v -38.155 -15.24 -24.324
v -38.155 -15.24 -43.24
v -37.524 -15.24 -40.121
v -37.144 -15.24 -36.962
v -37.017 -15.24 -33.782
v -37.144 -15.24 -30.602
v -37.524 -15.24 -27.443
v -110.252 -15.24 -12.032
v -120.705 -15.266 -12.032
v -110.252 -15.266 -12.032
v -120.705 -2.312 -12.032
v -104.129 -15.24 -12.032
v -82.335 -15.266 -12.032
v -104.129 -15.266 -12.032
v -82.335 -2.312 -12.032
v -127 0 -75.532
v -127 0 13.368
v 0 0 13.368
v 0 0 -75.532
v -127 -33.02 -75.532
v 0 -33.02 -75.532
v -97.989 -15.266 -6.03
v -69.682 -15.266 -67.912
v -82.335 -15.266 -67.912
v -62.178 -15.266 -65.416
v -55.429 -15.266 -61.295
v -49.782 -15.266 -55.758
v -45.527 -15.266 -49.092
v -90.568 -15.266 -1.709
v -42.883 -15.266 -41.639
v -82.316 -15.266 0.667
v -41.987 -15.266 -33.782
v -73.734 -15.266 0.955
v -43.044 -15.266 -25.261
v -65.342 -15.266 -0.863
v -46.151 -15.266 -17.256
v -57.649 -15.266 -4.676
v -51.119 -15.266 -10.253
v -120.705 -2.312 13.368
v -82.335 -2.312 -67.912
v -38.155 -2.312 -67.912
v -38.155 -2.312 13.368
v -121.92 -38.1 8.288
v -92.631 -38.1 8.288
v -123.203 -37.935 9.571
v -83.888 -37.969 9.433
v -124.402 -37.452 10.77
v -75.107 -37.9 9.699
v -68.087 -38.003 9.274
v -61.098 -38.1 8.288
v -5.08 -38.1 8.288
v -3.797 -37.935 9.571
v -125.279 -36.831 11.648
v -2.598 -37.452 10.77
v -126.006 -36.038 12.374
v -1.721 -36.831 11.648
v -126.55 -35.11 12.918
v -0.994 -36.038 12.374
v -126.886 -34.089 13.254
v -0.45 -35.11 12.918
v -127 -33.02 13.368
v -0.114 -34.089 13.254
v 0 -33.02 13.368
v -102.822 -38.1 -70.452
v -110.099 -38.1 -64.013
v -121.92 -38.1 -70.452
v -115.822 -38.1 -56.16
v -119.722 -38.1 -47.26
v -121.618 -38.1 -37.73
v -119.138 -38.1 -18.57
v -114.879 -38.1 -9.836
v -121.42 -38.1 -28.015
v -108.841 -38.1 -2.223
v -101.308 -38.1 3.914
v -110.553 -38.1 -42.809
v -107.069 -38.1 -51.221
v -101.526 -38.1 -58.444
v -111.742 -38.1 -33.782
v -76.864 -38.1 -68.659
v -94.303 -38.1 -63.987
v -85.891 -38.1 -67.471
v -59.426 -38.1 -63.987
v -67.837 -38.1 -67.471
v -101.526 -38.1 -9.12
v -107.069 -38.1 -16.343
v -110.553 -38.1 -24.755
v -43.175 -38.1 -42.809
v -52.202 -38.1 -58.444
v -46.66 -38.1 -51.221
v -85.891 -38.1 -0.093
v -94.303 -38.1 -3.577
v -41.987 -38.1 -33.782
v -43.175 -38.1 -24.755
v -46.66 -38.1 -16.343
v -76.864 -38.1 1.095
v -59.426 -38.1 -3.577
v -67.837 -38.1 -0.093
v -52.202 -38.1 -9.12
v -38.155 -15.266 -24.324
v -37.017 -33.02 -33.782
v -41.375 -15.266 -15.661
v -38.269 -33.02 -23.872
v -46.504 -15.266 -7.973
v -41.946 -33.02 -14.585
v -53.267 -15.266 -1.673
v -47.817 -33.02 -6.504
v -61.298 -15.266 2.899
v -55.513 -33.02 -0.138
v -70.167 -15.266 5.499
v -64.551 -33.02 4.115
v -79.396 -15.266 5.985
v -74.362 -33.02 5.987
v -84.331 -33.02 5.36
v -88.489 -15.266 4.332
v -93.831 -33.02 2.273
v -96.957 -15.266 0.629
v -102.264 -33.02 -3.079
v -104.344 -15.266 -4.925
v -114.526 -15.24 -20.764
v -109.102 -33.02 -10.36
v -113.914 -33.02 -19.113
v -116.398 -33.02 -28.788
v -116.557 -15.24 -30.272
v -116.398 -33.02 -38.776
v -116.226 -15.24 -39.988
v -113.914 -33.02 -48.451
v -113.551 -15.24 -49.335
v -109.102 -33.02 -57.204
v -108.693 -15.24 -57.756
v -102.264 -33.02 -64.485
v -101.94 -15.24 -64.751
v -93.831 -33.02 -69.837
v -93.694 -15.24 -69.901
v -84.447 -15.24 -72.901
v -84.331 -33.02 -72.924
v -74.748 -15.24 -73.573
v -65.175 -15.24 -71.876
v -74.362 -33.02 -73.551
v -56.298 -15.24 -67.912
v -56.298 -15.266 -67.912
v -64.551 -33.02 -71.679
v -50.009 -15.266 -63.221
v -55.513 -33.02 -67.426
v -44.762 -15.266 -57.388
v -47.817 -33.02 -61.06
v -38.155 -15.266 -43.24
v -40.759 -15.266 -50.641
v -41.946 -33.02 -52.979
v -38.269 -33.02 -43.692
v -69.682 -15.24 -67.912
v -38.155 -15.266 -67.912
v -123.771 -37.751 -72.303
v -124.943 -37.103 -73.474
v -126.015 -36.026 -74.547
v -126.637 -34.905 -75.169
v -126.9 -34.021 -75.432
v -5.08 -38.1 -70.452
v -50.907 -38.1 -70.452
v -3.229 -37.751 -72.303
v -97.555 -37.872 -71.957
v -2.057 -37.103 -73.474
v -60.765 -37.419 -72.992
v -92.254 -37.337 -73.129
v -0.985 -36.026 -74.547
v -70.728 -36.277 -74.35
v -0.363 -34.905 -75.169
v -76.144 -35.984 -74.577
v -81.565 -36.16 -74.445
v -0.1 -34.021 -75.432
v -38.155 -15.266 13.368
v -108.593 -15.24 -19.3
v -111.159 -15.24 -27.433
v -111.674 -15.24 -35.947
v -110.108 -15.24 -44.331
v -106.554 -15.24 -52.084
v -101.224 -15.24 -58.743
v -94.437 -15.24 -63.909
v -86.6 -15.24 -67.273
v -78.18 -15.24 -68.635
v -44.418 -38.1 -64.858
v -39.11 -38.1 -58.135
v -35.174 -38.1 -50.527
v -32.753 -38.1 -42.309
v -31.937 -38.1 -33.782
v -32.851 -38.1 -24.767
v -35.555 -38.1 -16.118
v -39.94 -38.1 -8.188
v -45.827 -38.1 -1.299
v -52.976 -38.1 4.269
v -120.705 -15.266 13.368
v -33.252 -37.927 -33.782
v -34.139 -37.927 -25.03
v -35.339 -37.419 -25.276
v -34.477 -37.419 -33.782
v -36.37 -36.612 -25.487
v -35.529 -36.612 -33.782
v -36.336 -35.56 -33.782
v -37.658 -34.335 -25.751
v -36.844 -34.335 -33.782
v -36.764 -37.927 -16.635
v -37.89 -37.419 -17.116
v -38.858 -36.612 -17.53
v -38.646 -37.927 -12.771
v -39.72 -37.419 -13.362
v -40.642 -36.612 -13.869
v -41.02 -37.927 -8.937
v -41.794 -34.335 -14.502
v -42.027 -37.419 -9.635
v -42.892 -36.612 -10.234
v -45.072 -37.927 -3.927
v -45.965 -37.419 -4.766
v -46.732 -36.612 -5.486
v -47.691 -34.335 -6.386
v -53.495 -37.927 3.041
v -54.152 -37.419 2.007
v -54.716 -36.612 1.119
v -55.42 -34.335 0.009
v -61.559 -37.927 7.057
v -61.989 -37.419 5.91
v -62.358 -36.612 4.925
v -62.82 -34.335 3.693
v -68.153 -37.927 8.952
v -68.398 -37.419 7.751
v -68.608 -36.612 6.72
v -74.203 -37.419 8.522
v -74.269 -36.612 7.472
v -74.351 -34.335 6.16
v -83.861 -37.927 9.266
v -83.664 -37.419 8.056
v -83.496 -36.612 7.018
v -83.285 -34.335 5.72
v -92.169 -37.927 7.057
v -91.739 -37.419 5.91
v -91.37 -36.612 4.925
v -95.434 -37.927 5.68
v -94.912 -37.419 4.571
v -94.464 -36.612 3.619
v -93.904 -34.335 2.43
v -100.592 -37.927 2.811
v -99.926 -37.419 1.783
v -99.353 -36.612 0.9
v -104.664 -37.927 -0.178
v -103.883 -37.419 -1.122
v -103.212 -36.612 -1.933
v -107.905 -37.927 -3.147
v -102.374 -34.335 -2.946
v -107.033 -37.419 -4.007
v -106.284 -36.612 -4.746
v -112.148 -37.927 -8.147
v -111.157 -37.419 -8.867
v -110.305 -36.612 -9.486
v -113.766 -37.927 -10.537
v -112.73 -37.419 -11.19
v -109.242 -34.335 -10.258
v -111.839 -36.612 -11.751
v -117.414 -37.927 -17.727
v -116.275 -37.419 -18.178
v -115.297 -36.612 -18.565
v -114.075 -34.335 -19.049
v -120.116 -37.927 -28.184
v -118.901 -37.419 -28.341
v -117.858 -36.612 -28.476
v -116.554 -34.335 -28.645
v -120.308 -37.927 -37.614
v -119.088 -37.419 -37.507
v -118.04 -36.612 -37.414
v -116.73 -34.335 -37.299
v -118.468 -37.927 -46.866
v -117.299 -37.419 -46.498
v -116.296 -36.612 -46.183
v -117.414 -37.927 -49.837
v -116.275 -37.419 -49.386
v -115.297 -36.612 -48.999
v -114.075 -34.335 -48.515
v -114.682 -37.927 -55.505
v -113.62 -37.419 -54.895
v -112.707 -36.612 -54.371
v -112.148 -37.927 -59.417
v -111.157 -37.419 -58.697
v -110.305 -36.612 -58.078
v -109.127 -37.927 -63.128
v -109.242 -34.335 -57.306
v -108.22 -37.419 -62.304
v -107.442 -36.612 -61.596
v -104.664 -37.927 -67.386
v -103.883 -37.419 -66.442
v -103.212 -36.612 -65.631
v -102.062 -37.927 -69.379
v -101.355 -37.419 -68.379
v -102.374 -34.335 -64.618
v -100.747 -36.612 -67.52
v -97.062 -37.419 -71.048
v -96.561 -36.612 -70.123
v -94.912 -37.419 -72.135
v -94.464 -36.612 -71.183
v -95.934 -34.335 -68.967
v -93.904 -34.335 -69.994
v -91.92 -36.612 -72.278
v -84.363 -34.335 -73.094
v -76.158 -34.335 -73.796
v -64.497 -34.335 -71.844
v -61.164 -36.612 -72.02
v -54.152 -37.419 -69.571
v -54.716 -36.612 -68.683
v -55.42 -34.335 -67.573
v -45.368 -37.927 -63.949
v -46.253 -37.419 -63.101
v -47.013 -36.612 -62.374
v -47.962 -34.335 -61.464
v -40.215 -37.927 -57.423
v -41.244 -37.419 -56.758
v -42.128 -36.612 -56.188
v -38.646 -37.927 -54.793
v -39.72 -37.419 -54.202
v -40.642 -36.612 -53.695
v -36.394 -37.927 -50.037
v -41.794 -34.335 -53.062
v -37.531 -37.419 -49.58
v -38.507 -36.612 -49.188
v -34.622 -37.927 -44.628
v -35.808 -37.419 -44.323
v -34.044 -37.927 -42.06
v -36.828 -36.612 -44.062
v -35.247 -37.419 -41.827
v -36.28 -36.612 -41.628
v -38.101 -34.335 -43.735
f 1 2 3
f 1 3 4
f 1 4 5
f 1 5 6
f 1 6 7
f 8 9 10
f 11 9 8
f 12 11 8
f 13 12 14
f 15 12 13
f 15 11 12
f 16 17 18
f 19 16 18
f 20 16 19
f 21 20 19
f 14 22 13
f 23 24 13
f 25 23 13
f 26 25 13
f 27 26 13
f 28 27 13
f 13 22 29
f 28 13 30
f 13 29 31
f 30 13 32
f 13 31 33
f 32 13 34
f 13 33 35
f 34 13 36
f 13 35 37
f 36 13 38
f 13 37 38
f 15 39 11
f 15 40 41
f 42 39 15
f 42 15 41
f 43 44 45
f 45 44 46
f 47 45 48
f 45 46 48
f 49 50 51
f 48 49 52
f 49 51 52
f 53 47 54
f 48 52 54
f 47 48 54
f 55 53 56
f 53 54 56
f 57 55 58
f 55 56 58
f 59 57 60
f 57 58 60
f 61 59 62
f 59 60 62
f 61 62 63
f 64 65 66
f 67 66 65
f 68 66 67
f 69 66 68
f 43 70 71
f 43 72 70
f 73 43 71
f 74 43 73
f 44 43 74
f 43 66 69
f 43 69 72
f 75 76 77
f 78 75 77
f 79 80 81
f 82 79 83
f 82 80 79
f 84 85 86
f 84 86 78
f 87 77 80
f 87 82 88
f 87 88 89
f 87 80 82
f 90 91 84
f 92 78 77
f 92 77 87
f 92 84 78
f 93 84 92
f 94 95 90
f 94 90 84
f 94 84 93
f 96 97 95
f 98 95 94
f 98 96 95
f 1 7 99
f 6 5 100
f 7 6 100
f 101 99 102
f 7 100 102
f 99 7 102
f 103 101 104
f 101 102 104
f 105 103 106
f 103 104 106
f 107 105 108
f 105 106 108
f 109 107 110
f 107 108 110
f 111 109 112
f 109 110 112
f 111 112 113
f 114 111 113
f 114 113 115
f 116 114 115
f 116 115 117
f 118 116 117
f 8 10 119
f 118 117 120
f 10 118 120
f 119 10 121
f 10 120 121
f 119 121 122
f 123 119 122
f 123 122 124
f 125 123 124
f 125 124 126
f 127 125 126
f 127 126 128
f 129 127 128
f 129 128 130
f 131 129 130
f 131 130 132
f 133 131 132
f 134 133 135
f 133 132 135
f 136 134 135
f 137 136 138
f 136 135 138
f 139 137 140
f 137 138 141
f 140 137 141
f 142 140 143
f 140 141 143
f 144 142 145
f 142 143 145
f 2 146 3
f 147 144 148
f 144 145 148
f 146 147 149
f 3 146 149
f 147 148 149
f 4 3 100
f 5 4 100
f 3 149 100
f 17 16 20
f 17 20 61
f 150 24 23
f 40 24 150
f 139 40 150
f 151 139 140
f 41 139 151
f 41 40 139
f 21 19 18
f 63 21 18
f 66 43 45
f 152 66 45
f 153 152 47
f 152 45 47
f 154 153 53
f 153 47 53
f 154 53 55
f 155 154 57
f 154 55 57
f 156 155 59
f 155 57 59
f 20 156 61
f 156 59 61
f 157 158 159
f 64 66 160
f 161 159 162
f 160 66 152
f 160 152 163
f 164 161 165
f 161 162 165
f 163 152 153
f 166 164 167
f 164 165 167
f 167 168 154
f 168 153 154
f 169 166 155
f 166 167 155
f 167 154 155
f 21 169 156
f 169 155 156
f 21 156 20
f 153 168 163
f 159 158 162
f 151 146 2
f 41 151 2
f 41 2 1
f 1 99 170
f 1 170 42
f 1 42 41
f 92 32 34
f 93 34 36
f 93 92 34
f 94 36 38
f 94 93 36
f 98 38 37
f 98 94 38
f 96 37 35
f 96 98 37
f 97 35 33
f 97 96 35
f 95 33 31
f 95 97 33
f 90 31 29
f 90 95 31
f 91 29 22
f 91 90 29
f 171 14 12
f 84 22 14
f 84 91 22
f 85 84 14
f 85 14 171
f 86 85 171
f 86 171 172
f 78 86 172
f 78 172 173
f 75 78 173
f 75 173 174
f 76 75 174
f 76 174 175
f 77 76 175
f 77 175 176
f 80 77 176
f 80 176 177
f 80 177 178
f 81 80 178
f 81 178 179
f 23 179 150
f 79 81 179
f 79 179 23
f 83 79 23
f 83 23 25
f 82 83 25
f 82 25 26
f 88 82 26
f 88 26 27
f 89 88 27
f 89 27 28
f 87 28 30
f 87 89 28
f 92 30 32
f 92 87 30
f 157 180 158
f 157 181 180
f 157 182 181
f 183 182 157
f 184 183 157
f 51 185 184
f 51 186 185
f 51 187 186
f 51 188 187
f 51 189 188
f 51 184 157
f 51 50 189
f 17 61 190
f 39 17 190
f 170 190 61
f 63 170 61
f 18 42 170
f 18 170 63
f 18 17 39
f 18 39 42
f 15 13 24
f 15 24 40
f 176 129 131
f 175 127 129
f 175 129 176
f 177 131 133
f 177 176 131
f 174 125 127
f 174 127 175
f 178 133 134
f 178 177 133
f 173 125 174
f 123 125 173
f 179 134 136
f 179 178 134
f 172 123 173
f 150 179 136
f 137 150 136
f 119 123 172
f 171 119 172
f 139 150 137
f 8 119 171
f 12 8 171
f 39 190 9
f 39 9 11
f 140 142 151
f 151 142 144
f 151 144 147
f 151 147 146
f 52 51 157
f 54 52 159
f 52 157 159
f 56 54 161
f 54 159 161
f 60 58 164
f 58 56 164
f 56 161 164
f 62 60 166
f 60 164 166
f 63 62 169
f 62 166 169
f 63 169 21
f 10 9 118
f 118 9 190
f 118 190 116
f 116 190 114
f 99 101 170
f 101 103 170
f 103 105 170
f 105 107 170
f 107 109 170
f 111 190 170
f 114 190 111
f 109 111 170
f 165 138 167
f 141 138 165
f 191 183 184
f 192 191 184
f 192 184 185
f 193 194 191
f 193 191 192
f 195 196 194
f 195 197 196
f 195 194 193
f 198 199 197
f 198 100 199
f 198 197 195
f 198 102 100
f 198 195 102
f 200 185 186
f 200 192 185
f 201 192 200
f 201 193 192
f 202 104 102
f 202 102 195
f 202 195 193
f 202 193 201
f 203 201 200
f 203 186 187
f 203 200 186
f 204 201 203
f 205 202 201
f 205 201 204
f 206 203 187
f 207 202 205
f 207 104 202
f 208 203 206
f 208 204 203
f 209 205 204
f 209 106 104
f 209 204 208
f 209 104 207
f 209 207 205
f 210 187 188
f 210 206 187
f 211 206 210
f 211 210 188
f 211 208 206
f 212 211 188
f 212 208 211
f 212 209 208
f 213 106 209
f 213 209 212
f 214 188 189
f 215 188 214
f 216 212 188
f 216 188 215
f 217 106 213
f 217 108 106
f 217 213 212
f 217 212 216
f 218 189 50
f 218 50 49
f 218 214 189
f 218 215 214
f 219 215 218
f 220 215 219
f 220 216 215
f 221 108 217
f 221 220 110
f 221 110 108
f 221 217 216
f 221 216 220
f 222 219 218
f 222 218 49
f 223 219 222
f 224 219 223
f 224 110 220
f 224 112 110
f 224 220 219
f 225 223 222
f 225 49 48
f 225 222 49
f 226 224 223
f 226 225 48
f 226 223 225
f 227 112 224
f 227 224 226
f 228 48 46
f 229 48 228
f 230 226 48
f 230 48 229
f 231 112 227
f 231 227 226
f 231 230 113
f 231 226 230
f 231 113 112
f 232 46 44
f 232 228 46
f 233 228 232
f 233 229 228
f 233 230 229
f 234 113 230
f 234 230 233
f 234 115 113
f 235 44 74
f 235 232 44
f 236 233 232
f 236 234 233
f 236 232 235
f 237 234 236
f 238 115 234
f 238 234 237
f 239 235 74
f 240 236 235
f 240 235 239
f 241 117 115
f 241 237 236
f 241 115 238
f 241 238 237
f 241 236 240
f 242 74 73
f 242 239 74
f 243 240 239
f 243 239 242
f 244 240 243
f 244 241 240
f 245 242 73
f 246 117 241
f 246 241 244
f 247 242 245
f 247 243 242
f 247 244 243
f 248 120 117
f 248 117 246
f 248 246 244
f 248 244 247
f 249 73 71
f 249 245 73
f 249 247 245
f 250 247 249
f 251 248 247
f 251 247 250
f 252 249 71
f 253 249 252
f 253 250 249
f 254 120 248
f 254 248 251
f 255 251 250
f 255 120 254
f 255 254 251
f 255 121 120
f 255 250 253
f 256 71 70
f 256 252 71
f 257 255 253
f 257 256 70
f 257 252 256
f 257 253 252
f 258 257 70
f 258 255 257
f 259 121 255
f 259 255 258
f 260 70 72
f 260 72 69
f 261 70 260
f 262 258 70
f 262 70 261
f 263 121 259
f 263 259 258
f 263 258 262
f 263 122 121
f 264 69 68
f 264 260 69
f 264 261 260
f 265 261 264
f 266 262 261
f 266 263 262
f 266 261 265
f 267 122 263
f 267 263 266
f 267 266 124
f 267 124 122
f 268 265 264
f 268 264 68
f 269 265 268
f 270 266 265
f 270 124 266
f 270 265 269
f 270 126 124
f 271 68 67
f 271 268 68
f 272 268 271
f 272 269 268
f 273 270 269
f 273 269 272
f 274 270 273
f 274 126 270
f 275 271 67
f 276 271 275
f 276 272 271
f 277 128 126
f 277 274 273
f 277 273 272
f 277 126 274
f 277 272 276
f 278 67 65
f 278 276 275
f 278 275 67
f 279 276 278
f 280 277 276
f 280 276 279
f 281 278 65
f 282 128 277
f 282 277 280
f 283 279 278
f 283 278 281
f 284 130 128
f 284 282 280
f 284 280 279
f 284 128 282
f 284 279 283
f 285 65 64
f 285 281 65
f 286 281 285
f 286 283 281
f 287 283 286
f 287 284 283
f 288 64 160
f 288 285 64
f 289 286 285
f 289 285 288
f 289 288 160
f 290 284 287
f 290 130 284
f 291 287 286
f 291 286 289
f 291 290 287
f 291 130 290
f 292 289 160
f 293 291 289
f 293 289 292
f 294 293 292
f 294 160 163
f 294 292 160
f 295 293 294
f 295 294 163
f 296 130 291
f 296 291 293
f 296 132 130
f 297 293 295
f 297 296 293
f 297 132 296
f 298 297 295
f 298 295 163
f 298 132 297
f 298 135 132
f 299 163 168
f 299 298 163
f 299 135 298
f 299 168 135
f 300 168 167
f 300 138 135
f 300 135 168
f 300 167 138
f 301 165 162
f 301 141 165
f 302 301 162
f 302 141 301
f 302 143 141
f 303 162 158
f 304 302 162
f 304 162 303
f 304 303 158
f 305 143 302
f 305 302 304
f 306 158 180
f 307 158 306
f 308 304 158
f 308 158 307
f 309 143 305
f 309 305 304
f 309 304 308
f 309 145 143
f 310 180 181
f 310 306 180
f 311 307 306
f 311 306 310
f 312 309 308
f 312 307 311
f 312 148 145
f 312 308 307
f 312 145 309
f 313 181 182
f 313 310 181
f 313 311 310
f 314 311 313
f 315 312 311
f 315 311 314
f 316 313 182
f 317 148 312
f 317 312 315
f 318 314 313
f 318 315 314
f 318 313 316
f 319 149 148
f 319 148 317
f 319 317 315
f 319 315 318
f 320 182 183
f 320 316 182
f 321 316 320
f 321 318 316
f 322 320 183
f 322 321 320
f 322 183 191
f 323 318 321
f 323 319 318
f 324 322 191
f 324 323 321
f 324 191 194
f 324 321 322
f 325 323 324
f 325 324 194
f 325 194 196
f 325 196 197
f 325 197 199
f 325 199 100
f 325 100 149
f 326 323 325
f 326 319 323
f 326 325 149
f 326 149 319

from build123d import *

# Parameters (mm, degrees)
F0_W         = 127
F0_H         = 88.9
F1_DEPTH     = 38.1
F2_W         = 127
F2_H         = 38.1
F2_W_2       = 82.55
F2_H_2       = 12.954
F3_DEPTH     = 25.4
F4_DEPTH     = 25.4
F5_W         = 44.1795827687
F5_H         = 12.954
F6_DEPTH     = 81.28
F7_R         = 39.8475218447
F7_R_2       = 34.8773795478
F8_DEPTH     = 22.86
F9_T3_DEPTH  = 152.4
F9_T6_DEPTH  = 114.3
F9_T9_DEPTH  = 114.3
F9_T12_DEPTH = 152.4


# Not quite as in the source:
# - a fillet or chamfer that OpenCascade refuses, or shapes differently, is made with other operations: its cross-section is extruded or revolved along the edge and cut away or added


with BuildPart() as f1:
    # F0 (on Front) → F1 (new body)
    with BuildSketch(Plane.XZ):
        with Locations((-63.5, -31.0818182497)):
            Rectangle(F0_W, F0_H)
    extrude(amount=F1_DEPTH)

    # F2 (on face) → F3 (join)
    with BuildSketch(Plane.XY.offset(13.3681817503)):
        with Locations((-63.5, -19.05)):
            Rectangle(F2_W, F2_H)
        with Locations((-79.4304944575, -8.7889100092)):
            Rectangle(F2_W_2, F2_H_2, mode=Mode.SUBTRACT)
    extrude(amount=-F3_DEPTH)

    # F2 (on face) → F4 (cut)
    with BuildSketch(Plane.XY.offset(13.3681817503)):
        with Locations((-79.4304944575, -8.7889100092)):
            Rectangle(F2_W_2, F2_H_2)
    extrude(amount=-F4_DEPTH, mode=Mode.SUBTRACT)

    # F5 (on face) → F6 (cut)
    with BuildSketch(Plane.XY.offset(13.3681817503)):
        with Locations((-60.2452858418, -8.7889100092)):
            Rectangle(F5_W, F5_H)
    extrude(amount=-F6_DEPTH, mode=Mode.SUBTRACT)

    # F7 (on face) → F8 (cut)
    with BuildSketch(Plane.XZ.offset(38.1)):
        with Locations((-76.8643096089, -33.7820015848)):
            Circle(F7_R)
        with Locations((-76.8643096089, -33.7820015848)):
            Circle(F7_R_2, mode=Mode.SUBTRACT)
    extrude(amount=-F8_DEPTH, mode=Mode.SUBTRACT)

    # F9: fillet of radius 5.08 on 5 edges, made by hand


with BuildPart() as f9_tool1:
    # F9_s2 → F9_t3 (new body)
    with BuildSketch(Plane.YZ.offset(12.7)):
        with BuildLine():
            ThreePointArc((-38.1, 8.2881817503), (-36.6121024484, 11.8802841987), (-33.02, 13.3681817503))
            Line((-33.02, 13.3681817503), (-38.1, 13.3681817503))
            Line((-38.1, 13.3681817503), (-38.1, 8.2881817503))
        make_face()
    extrude(amount=-F9_T3_DEPTH)


with BuildPart() as f9_tool4:
    # F9_s5 → F9_t6 (new body)
    with BuildSketch(Plane.XY.offset(-88.2318182497)):
        with BuildLine():
            ThreePointArc((-5.08, -38.1), (-1.4878975516, -36.6121024484), (0, -33.02))
            Line((0, -33.02), (0, -38.1))
            Line((0, -38.1), (-5.08, -38.1))
        make_face()
    extrude(amount=F9_T6_DEPTH)


with BuildPart() as f9_tool7:
    # F9_s8 → F9_t9 (new body)
    with BuildSketch(Plane.XY.offset(26.0681817503)):
        with BuildLine():
            ThreePointArc((-121.92, -38.1), (-125.5121024484, -36.6121024484), (-127, -33.02))
            Line((-127, -33.02), (-127, -38.1))
            Line((-127, -38.1), (-121.92, -38.1))
        make_face()
    extrude(amount=-F9_T9_DEPTH)


with BuildPart() as f9_tool10:
    # F9_s11 → F9_t12 (new body)
    with BuildSketch(Plane.YZ.offset(-139.7)):
        with BuildLine():
            ThreePointArc((-38.1, -70.4518182497), (-36.6121024484, -74.0439206982), (-33.02, -75.5318182497))
            Line((-33.02, -75.5318182497), (-38.1, -75.5318182497))
            Line((-38.1, -75.5318182497), (-38.1, -70.4518182497))
        make_face()
    extrude(amount=F9_T12_DEPTH)


with BuildPart() as f9_tool13:
    # F9_s14 → F9_t15 (revolve)
    with BuildSketch(Plane.XY.offset(-33.7820015848)):
        with BuildLine():
            ThreePointArc((-31.9367877642, -38.1), (-35.5288902127, -36.6121024484), (-37.0167877642, -33.02))
            Line((-37.0167877642, -33.02), (-37.0167877642, -38.1))
            Line((-37.0167877642, -38.1), (-31.9367877642, -38.1))
        make_face()
    revolve(axis=Axis((-76.8643096089, -38.1, -33.7820015848), (0, -1, 0)))


with BuildPart() as f1_1:
    add(f1.part)

    # F9_t16: cut F9_tool1, F9_tool4, F9_tool7, F9_tool10, F9_tool13
    add([f9_tool1.part, f9_tool4.part, f9_tool7.part, f9_tool10.part, f9_tool13.part], mode=Mode.SUBTRACT)


solid = f1_1.part
